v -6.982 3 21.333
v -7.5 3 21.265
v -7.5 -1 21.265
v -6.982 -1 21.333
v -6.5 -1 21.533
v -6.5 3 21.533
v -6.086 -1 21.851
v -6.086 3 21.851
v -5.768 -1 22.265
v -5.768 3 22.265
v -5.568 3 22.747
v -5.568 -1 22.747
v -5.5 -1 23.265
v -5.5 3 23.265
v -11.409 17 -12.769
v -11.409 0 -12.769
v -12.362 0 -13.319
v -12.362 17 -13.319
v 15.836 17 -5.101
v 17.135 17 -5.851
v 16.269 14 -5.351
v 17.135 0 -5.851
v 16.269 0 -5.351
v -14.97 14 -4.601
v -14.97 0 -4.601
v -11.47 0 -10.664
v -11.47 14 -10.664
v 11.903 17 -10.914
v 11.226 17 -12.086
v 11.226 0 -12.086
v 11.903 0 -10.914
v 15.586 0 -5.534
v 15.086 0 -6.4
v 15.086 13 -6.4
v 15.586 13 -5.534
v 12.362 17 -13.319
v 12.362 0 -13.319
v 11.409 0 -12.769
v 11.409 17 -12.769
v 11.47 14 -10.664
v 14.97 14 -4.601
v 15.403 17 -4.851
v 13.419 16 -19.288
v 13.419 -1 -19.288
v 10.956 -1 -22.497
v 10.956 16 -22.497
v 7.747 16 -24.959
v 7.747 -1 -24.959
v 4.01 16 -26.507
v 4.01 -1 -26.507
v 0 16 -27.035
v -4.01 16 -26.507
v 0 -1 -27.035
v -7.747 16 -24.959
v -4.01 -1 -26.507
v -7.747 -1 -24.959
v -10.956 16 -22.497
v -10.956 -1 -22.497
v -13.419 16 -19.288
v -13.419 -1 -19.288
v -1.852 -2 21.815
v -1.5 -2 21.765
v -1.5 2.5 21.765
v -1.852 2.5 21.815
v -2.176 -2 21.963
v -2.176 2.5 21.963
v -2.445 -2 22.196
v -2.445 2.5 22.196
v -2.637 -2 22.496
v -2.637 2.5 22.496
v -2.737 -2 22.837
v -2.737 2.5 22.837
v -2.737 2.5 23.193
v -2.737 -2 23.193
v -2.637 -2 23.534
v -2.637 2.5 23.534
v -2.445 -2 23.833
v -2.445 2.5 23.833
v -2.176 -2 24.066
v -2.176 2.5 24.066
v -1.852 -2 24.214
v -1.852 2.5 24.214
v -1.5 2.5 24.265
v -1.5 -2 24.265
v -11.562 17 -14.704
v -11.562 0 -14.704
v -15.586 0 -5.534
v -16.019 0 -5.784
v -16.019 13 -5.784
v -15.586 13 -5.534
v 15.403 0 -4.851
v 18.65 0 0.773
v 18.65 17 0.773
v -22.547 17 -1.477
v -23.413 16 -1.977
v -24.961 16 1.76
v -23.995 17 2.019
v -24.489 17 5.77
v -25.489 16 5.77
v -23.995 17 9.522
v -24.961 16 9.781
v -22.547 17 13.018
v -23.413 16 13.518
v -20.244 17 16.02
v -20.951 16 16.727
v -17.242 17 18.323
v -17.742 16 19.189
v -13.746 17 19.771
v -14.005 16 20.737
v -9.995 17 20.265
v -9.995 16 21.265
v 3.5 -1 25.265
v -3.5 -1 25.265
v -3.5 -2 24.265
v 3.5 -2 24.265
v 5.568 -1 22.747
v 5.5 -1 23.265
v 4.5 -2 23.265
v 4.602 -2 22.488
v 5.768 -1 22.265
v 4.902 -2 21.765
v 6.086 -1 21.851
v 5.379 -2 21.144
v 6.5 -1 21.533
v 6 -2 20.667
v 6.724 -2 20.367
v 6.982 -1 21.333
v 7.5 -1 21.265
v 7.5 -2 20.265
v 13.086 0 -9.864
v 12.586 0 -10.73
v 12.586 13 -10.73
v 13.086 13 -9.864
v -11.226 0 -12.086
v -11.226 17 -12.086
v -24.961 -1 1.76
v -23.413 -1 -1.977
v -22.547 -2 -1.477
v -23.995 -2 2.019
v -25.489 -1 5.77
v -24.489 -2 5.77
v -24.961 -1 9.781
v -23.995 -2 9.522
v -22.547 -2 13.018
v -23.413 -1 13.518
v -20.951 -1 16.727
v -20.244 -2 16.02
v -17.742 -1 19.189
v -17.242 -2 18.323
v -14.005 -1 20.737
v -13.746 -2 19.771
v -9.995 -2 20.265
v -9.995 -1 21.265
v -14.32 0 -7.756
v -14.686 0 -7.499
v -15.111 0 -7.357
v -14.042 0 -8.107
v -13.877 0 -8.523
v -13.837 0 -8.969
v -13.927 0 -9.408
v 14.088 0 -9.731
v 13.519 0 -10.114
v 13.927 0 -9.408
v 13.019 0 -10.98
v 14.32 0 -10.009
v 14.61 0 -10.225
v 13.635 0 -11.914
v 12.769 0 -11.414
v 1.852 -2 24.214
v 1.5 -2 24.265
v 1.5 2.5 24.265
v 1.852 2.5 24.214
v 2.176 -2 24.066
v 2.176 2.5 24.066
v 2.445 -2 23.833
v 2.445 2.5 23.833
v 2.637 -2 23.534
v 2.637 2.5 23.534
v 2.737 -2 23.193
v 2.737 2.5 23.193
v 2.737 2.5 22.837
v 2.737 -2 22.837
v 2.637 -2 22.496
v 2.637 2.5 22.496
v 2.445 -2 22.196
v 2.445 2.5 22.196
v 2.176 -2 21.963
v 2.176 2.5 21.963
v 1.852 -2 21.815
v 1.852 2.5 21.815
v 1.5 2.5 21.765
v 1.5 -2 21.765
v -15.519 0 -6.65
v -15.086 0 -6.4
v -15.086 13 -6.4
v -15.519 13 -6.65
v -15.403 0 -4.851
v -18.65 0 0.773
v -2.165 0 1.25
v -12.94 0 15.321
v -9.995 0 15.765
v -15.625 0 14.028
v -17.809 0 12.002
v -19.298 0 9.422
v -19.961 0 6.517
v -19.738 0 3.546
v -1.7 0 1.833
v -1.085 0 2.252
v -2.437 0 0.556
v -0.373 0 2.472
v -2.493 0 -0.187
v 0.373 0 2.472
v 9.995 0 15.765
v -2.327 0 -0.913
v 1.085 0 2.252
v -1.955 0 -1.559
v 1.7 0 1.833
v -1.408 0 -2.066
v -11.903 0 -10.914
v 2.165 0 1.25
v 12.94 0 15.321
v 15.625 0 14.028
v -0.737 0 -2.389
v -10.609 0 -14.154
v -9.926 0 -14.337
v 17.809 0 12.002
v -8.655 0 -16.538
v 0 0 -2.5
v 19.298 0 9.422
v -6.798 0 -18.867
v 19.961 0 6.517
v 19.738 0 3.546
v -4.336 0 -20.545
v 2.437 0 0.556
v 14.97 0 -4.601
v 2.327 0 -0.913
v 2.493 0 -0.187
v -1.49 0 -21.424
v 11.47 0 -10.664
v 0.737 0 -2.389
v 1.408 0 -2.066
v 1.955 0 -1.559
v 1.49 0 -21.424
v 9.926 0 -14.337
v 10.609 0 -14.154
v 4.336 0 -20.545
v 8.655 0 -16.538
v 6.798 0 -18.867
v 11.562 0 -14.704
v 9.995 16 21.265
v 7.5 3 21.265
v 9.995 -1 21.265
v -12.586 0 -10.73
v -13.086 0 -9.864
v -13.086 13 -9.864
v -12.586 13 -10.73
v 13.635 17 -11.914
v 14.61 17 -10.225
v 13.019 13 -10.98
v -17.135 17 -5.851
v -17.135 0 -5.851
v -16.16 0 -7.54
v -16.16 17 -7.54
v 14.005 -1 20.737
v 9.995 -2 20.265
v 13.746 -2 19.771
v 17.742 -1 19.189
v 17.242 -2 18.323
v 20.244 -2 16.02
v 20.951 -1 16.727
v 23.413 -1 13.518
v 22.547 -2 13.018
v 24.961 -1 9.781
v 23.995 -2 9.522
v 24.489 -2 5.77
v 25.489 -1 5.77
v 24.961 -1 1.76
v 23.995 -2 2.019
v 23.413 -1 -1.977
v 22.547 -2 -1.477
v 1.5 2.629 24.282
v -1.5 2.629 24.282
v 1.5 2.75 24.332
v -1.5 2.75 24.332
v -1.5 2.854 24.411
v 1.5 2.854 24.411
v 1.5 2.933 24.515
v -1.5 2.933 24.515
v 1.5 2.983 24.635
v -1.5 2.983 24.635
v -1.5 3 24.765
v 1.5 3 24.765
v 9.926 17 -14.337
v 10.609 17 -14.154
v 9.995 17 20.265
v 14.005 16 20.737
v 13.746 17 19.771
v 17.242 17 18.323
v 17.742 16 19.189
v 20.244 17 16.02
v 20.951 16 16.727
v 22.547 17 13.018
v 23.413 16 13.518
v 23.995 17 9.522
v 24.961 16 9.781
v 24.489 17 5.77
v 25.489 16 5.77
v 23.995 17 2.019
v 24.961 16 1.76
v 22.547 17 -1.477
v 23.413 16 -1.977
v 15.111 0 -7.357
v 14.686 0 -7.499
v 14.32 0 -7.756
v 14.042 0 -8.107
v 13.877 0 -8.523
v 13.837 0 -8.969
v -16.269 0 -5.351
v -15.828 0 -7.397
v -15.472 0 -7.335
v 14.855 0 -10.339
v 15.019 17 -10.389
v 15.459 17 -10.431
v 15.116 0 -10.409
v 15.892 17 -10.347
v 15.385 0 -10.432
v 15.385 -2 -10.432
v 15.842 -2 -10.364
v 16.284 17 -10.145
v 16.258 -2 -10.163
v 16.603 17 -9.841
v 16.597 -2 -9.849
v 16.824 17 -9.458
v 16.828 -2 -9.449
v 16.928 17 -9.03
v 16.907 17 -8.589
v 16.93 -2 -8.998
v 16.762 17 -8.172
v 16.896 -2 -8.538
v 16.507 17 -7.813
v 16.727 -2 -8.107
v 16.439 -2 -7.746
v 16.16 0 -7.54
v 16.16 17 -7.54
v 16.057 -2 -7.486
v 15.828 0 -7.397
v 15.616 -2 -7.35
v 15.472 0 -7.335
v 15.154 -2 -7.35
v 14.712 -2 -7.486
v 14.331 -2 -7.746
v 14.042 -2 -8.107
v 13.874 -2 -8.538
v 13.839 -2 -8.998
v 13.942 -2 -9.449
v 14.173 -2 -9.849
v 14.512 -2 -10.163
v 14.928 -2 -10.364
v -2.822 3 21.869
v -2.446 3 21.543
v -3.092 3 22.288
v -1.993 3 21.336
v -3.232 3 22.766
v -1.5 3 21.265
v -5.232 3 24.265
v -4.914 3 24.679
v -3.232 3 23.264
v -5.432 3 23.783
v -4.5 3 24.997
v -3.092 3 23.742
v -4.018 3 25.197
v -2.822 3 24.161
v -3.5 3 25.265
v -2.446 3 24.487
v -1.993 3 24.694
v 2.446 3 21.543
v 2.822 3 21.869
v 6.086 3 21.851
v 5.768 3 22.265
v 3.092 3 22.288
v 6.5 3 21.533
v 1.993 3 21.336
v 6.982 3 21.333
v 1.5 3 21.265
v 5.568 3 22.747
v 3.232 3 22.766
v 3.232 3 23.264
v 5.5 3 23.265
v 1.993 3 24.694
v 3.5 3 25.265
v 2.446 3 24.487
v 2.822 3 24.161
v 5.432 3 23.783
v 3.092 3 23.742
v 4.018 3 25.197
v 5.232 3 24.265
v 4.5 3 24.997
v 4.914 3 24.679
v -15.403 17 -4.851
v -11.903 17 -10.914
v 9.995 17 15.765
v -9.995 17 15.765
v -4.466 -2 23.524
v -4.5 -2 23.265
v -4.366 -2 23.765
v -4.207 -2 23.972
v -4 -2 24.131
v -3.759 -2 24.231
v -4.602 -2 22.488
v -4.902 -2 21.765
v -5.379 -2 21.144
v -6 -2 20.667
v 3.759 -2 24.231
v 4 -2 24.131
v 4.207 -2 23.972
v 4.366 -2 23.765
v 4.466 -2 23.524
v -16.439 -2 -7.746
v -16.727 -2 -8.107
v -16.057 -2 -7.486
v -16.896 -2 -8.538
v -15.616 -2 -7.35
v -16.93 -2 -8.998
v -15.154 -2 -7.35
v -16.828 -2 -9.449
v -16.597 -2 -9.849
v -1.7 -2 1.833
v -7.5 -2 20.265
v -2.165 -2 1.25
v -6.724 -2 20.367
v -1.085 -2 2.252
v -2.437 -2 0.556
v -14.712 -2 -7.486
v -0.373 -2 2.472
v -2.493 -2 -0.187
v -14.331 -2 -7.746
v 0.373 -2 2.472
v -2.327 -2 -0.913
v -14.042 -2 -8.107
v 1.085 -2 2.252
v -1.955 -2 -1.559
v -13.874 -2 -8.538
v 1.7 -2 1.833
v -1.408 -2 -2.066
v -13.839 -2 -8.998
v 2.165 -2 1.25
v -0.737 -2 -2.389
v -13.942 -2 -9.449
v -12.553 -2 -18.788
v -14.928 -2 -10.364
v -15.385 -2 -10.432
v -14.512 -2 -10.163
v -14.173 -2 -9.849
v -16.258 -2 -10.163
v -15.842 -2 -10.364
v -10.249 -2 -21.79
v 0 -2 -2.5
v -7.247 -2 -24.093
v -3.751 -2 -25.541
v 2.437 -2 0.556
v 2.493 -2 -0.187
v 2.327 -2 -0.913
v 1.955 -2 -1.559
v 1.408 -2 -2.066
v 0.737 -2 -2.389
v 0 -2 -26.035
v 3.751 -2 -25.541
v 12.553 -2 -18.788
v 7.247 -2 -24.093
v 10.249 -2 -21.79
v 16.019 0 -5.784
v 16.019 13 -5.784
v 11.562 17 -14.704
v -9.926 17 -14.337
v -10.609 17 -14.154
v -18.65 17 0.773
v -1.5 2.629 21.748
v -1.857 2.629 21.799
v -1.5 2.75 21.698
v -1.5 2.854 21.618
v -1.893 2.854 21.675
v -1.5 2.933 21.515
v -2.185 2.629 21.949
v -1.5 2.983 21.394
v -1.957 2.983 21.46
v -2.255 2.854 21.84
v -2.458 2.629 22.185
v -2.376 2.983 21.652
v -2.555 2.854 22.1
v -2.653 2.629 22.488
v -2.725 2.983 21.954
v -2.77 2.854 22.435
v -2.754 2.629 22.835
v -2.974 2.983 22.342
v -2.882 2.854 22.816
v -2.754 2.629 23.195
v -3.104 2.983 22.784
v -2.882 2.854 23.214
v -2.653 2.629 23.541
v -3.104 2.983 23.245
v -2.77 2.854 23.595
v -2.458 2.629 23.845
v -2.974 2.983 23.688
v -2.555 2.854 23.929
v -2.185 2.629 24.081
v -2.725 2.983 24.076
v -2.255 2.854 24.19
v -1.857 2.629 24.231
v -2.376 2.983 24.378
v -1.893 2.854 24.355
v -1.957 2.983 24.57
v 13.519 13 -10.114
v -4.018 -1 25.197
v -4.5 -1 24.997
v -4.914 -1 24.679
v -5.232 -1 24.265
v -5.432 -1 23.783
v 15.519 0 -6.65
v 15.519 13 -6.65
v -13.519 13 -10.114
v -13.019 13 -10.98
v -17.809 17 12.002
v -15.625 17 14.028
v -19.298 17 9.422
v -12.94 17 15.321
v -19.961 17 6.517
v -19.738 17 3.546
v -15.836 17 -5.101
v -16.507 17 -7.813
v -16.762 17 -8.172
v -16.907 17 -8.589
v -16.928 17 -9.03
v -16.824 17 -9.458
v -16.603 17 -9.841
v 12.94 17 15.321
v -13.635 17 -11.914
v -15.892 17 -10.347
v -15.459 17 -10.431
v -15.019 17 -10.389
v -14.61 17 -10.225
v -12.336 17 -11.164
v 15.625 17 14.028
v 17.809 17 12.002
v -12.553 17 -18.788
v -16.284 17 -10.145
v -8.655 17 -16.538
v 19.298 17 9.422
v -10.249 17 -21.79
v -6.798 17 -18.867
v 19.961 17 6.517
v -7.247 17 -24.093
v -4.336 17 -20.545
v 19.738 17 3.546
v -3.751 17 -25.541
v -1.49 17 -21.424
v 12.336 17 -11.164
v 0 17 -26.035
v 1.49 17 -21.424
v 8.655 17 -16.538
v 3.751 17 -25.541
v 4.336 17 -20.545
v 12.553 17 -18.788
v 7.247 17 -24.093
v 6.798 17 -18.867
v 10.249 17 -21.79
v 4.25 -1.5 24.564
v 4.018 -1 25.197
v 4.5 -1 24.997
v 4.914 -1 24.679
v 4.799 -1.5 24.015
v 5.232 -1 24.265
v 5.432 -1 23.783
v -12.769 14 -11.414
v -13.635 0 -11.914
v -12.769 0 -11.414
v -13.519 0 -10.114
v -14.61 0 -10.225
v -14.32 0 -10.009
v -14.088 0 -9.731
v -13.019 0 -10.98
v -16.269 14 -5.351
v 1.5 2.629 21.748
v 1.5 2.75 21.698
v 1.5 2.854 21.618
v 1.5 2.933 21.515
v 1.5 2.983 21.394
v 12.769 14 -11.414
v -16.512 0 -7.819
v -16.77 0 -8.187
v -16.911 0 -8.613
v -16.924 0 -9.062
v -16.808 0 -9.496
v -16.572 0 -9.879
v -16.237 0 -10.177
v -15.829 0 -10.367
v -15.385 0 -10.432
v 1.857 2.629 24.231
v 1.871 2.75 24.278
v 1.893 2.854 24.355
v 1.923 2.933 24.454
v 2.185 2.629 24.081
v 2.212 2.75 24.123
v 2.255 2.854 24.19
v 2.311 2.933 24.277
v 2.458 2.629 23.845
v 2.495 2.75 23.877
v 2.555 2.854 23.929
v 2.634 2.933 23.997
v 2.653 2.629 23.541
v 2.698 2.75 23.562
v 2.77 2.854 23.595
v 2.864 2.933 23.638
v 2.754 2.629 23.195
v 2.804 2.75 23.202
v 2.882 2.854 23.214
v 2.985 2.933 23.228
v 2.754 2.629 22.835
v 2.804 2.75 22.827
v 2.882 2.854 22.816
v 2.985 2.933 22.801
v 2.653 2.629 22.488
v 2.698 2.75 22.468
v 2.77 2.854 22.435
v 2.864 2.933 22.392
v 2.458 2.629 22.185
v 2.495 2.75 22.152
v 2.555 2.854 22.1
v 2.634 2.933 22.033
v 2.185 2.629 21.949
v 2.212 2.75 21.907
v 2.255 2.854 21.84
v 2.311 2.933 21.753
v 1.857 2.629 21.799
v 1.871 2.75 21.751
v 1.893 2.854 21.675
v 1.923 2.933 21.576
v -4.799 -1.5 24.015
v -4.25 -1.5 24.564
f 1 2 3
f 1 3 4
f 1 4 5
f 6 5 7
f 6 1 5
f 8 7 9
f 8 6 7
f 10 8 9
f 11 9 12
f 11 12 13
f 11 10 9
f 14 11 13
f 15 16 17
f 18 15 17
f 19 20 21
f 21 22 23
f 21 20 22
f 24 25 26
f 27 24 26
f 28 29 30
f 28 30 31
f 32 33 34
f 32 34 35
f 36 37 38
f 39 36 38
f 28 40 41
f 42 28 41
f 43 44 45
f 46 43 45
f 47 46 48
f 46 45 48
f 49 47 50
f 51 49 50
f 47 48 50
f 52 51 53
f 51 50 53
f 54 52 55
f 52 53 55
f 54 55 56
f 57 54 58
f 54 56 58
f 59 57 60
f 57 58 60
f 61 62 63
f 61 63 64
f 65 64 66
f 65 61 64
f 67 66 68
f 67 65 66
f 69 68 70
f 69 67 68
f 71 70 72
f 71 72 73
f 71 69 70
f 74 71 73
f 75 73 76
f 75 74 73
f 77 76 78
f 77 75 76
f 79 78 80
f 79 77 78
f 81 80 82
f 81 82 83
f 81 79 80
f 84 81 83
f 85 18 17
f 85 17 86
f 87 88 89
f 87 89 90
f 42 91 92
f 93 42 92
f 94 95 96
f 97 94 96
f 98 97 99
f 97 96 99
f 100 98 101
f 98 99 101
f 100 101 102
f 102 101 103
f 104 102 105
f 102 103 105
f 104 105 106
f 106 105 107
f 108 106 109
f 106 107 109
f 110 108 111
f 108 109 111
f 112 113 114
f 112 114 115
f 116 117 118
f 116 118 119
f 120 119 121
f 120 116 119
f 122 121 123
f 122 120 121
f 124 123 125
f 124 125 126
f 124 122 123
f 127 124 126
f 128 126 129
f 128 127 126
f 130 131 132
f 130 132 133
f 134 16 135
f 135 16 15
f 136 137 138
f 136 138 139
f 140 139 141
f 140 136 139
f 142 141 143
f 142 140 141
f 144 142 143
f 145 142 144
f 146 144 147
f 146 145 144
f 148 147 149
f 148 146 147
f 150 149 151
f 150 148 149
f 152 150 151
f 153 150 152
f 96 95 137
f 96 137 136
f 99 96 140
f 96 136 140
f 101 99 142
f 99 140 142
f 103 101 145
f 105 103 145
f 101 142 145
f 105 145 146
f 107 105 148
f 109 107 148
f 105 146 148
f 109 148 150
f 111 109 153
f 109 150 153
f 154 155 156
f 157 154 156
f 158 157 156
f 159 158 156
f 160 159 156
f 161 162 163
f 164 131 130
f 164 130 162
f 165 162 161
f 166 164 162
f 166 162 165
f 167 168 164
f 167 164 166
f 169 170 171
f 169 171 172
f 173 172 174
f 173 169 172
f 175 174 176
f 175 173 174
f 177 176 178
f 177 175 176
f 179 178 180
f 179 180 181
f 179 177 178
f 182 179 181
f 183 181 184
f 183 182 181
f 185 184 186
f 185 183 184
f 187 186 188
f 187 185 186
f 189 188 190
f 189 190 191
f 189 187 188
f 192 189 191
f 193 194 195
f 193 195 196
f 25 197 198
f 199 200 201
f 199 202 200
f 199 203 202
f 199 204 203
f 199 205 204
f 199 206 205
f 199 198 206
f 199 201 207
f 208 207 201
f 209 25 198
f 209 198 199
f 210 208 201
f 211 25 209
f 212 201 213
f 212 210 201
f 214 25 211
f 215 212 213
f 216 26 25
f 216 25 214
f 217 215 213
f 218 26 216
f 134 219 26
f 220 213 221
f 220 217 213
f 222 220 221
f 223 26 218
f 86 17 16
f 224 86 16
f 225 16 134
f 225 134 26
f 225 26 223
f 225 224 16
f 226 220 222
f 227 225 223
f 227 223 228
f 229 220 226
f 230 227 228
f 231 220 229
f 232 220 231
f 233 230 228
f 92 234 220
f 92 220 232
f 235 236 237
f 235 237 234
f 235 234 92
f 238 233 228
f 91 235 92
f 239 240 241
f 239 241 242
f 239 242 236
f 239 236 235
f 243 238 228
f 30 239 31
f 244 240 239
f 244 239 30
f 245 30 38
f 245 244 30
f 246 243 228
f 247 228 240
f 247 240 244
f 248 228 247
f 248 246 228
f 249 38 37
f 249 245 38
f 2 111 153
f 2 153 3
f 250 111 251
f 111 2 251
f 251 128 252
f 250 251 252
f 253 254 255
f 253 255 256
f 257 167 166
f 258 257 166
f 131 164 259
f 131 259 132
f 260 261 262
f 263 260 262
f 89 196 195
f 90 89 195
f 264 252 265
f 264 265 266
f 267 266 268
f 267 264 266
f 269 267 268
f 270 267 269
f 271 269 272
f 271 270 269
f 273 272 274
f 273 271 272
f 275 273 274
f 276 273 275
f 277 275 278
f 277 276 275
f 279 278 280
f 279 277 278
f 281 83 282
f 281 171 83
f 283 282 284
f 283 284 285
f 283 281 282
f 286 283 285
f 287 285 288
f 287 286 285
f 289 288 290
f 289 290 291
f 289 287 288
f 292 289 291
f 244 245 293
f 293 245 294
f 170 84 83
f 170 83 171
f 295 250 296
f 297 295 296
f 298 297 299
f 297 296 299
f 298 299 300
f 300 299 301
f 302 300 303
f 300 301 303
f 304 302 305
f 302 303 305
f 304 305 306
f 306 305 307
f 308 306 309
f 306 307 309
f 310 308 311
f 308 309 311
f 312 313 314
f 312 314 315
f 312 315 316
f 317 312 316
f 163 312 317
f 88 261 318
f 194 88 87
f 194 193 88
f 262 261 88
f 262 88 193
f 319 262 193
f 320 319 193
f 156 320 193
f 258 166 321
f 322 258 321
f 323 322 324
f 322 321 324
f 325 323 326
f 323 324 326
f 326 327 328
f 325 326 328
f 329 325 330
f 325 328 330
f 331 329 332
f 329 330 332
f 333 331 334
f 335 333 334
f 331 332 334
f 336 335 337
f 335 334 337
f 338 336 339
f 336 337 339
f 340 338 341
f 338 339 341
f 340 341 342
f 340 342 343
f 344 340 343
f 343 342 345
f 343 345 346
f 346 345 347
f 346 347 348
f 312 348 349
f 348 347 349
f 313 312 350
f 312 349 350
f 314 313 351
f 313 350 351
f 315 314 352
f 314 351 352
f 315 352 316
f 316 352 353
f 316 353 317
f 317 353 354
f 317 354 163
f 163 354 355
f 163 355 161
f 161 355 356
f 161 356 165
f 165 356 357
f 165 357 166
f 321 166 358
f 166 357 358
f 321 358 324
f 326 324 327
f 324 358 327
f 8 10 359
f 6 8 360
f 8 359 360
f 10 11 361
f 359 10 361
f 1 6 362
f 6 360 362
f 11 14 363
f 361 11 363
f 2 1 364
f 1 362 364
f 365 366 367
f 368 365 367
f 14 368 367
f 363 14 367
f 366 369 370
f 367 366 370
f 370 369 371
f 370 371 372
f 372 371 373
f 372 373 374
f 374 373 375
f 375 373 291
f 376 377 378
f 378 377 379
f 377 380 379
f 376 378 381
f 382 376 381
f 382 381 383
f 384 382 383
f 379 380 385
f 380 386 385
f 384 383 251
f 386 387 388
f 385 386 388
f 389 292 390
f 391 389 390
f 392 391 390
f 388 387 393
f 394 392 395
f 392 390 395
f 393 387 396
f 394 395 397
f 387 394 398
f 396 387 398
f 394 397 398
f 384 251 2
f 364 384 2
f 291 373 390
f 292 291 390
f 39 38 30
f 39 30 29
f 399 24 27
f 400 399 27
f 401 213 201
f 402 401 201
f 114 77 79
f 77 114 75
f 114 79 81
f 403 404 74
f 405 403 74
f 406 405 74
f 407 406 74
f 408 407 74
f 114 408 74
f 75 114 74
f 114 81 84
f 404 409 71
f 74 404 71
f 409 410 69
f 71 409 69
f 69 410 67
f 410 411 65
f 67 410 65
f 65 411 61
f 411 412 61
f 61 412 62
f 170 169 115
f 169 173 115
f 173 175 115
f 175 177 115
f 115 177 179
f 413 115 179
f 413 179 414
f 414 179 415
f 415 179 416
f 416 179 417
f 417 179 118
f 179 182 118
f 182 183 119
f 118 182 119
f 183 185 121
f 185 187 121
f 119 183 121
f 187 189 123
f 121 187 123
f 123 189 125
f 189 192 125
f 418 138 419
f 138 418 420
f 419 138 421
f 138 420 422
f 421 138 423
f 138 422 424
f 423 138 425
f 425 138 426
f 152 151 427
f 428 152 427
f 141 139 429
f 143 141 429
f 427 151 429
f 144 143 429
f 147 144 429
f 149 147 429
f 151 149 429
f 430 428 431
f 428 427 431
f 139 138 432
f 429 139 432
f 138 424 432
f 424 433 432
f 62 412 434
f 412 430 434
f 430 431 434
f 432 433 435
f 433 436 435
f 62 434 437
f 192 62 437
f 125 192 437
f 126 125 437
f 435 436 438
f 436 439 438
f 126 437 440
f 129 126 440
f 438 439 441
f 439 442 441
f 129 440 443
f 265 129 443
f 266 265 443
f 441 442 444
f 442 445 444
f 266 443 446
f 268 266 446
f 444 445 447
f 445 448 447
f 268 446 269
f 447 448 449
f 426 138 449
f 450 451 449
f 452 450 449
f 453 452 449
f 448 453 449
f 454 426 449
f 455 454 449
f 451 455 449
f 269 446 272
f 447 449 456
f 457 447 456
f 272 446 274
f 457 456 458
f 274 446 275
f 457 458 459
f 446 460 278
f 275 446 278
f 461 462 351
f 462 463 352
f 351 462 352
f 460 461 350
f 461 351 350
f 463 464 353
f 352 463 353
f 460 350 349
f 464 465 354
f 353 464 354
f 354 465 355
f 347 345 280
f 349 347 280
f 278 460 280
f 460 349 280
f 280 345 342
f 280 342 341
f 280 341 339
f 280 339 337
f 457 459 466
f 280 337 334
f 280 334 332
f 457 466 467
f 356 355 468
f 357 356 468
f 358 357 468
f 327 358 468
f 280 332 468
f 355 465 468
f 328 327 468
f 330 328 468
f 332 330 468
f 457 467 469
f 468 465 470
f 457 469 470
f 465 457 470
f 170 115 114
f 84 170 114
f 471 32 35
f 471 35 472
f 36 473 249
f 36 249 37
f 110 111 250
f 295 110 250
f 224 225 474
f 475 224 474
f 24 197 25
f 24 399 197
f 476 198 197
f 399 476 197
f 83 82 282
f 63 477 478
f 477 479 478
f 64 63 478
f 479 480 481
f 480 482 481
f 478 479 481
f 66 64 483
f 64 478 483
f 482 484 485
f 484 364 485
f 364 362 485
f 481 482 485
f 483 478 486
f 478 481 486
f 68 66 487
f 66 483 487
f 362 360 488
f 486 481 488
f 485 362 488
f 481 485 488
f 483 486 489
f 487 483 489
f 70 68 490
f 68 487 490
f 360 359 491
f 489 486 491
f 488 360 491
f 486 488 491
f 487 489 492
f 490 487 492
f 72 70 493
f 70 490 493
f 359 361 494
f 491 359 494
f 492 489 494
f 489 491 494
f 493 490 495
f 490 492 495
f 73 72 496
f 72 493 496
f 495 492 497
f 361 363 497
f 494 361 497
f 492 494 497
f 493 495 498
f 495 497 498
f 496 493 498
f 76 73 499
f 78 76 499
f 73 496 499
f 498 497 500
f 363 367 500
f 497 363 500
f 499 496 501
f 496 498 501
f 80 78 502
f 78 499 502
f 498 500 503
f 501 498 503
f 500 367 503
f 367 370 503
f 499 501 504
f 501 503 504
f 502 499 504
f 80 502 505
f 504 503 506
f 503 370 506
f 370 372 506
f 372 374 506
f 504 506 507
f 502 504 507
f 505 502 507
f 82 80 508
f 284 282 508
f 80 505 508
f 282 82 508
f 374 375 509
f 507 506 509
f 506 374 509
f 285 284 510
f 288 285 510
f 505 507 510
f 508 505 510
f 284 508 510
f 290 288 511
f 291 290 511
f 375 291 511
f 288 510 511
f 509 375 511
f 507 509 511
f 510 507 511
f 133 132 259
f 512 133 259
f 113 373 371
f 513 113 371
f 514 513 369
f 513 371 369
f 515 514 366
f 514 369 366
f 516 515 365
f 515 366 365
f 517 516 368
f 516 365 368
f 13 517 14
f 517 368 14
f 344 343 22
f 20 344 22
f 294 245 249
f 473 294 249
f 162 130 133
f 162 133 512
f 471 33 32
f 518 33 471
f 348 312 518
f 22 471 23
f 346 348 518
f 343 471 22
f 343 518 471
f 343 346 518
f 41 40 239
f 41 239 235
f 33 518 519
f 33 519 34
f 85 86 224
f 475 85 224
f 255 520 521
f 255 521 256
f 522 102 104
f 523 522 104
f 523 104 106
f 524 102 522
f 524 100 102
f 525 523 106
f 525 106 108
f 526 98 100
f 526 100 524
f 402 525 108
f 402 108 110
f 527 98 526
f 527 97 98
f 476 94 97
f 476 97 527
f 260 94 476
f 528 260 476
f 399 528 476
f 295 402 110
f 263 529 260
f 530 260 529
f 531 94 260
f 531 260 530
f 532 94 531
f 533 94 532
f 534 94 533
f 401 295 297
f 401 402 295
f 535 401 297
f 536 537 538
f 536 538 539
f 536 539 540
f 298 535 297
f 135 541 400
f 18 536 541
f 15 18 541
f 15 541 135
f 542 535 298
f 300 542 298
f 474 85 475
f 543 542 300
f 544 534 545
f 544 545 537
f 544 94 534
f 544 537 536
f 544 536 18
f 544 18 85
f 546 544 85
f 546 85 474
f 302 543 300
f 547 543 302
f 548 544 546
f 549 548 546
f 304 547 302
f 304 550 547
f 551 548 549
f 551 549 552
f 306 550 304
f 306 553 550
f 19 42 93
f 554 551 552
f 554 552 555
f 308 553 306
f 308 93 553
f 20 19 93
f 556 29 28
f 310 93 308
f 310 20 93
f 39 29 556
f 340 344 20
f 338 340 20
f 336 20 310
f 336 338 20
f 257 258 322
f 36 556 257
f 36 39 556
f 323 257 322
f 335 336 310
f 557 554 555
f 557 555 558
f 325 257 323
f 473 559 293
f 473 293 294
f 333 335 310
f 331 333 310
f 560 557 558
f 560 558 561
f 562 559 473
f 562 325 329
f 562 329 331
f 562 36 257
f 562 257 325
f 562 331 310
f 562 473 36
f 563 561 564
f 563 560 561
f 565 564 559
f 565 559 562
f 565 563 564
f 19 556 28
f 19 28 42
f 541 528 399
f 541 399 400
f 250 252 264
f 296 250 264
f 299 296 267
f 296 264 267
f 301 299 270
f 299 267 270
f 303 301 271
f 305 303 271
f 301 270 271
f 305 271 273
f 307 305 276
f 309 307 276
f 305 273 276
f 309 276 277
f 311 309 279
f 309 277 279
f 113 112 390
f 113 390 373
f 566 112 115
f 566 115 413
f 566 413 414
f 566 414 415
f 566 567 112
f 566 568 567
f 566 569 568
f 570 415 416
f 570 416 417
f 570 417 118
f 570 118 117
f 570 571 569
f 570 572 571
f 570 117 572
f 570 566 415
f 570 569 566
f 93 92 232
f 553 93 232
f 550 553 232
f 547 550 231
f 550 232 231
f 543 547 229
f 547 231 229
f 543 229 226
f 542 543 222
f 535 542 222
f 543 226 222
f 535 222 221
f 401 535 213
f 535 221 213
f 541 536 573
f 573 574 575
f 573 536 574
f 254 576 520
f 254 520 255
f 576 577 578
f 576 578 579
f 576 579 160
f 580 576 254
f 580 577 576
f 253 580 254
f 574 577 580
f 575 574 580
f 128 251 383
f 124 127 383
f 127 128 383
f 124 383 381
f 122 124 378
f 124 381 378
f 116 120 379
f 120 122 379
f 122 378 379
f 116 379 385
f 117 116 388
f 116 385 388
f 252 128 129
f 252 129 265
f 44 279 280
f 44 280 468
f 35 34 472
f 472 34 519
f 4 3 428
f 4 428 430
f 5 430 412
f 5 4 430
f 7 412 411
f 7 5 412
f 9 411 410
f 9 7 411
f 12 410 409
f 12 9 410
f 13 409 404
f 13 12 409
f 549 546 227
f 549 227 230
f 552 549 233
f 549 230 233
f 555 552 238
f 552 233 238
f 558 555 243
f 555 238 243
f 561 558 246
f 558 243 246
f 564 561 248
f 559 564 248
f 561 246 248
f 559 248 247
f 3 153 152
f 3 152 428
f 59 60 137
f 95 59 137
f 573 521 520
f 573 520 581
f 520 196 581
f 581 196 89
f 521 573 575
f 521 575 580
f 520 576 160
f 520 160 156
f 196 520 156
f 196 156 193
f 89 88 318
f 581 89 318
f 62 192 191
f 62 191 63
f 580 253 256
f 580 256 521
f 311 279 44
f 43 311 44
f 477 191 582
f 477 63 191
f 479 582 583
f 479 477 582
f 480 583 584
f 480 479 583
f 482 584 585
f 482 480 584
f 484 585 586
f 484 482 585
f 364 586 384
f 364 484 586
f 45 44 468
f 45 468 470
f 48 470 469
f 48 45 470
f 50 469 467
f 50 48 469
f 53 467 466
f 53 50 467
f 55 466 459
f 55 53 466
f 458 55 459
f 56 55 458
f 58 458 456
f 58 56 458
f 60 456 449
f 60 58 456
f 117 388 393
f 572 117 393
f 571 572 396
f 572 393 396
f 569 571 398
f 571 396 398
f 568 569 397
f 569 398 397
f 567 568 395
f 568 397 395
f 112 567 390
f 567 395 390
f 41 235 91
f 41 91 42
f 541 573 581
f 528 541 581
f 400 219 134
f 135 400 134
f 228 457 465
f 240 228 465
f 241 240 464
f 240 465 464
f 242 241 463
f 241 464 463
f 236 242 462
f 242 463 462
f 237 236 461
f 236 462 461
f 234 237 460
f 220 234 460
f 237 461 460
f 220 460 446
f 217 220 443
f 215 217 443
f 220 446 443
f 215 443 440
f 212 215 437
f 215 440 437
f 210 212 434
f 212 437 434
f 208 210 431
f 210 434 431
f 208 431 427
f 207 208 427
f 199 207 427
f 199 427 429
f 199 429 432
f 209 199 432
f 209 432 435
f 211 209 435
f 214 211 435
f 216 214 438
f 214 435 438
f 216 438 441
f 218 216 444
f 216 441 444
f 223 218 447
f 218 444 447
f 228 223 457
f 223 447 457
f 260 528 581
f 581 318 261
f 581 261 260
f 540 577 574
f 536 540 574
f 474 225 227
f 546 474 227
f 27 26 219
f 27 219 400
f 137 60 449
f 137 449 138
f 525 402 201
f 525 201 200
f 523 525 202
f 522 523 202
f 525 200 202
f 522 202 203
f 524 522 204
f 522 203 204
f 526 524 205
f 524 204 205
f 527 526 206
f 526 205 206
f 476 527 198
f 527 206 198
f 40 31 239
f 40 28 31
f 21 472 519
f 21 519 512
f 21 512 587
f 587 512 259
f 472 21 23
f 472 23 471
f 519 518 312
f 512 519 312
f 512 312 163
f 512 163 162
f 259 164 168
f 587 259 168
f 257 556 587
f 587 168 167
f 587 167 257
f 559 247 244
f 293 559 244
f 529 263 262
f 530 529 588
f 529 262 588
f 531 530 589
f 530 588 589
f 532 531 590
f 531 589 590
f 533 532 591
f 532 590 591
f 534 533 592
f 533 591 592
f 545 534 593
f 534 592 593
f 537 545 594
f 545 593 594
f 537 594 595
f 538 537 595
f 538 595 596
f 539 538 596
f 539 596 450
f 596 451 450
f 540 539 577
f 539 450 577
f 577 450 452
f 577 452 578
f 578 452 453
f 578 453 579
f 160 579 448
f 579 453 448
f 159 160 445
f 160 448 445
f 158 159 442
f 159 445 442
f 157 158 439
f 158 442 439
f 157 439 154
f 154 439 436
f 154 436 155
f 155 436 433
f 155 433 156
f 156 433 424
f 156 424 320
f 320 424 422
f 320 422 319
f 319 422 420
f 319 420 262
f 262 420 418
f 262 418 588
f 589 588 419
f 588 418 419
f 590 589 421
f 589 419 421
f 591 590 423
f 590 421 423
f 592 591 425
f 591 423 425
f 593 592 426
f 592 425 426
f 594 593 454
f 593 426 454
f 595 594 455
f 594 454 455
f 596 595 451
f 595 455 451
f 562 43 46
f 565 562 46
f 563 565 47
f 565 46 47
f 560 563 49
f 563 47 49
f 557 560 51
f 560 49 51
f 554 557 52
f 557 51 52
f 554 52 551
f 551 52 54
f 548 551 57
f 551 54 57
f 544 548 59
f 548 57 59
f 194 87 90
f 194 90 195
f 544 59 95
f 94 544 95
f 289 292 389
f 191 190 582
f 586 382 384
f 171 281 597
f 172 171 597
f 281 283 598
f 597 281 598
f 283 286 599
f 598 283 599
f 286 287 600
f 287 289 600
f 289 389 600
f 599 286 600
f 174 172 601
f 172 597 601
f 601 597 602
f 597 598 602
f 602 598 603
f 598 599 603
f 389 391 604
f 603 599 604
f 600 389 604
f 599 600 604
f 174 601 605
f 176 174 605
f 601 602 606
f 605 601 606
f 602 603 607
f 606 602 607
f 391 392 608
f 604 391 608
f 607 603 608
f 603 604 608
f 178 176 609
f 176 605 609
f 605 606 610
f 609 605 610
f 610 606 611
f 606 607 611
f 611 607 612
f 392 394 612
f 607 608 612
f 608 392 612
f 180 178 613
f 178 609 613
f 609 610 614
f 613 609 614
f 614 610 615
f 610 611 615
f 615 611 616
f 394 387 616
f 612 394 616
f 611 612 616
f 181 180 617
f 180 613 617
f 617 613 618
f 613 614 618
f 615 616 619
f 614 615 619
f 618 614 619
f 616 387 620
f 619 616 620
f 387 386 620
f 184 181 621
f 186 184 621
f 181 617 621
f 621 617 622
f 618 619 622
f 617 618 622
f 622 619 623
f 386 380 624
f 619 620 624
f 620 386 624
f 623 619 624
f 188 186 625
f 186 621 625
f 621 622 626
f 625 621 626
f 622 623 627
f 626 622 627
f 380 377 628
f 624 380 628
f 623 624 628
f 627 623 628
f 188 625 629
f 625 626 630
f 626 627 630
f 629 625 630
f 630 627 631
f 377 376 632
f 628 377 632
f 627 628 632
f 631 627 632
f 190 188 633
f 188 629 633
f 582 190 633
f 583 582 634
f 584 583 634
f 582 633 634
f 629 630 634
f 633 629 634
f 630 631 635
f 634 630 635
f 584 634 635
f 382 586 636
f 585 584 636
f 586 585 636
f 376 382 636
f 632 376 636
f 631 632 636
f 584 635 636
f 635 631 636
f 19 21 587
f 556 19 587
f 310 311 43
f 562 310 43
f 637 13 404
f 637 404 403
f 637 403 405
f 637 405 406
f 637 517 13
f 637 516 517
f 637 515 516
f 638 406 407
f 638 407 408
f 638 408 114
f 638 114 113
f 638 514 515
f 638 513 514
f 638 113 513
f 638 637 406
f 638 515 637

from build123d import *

# Parameters (mm, degrees)
BOSS_EXTRUDE1_DEPTH = 17
CHAMFER1_SIZE       = 0.5
CUT_EXTRUDE1_DEPTH  = 13
BOSS_EXTRUDE2_START = -2
BOSS_EXTRUDE2_DEPTH = 2
SKETCH2_R           = 1.5499999999999992
SKETCH2_R_2         = 1.550000000000003
SKETCH2_R_3         = 2.5
CUT_EXTRUDE2_DEPTH  = 2
BOSS_EXTRUDE3_DEPTH = 5
FILLET1_R           = 2
FILLET2_R           = 0.5
CHAMFER3_SIZE       = 0.5
CHAMFER3_SIZE2      = 3
CHAMFER4_SIZE       = 1


with BuildPart() as part:
    # Sketch1 → Boss-Extrude1 (new body)
    with BuildSketch(Plane(origin=(0, 0, 0), x_dir=(1, 0, 0), z_dir=(0, 1, 0))):
        with BuildLine():
            ThreePointArc((13.418634843133532, 19.2879126019326), (5.33e-15, 27.035165040773038), (-13.418634843133521, 19.287912601932604))
            Line((-13.418634843133521, 19.2879126019326), (-23.413139720814414, 1.9769223572943453))
            ThreePointArc((-23.413139720814414, 1.976922357294347), (-23.413139720814407, -13.517582520386524), (-9.994504877680875, -21.264834959226956))
            Line((-9.994504877680875, -21.264834959226956), (9.994504877680878, -21.26483495922696))
            ThreePointArc((9.994504877680878, -21.26483495922696), (23.413139720814414, -13.517582520386526), (23.41313972081442, 1.9769223572943506))
            Line((23.41313972081442, 1.9769223572943488), (13.418634843133532, 19.2879126019326))
        make_face()
        with BuildLine():
            Line((-11.469734859267339, 10.663506392859015), (-11.902747561159552, 10.91350639285901))
            Line((-11.902747561159554, 10.91350639285901), (-10.975952641916443, 12.518762281184774))
            Line((-10.975952641916448, 12.518762281184776), (-12.361593287971548, 13.318762281184778))
            Line((-12.361593287971548, 13.318762281184778), (-11.561593287971546, 14.70440292723988))
            Line((-11.561593287971546, 14.70440292723988), (-10.17595264191644, 13.904402927239877))
            Line((-10.175952641916442, 13.904402927239877), (-8.655495122319113, 16.537912601932604))
            ThreePointArc((-8.655495122319113, 16.537912601932604), (1.33e-15, 21.535165040773038), (8.655495122319117, 16.537912601932604))
            Line((8.655495122319117, 16.537912601932604), (10.175952641916444, 13.904402927239877))
            Line((10.175952641916444, 13.904402927239877), (11.561593287971549, 14.70440292723988))
            Line((11.561593287971549, 14.70440292723988), (12.361593287971552, 13.318762281184778))
            Line((12.361593287971552, 13.318762281184778), (10.975952641916452, 12.518762281184776))
            Line((10.975952641916447, 12.518762281184772), (11.902747561159558, 10.91350639285901))
            Line((11.902747561159556, 10.913506392859007), (11.46973485926734, 10.663506392859015))
            Line((11.46973485926734, 10.663506392859015), (14.969734859267339, 4.601328566367944))
            Line((14.969734859267339, 4.601328566367944), (15.402747561159552, 4.851328566367944))
            Line((15.402747561159552, 4.8513285663679415), (18.64999999999999, -0.7730776427056512))
            ThreePointArc((18.64999999999999, -0.7730776427056494), (18.65, -10.767582520386522), (9.994504877680878, -15.764834959226958))
            Line((9.994504877680878, -15.76483495922696), (-9.994504877680871, -15.76483495922696))
            ThreePointArc((-9.994504877680868, -15.76483495922696), (-18.64999999999999, -10.767582520386524), (-18.64999999999999, -0.7730776427056494))
            Line((-18.64999999999999, -0.7730776427056512), (-15.402747561159547, 4.851328566367947))
            Line((-15.40274756115955, 4.851328566367947), (-14.969734859267337, 4.601328566367946))
            Line((-14.969734859267337, 4.601328566367946), (-11.469734859267339, 10.663506392859015))
        make_face(mode=Mode.SUBTRACT)
        with BuildLine():
            Line((13.63479836872844, 11.913506392859018), (14.609798368728441, 10.224756855479358))
            ThreePointArc((14.609798368728436, 10.224756855479354), (16.727137744594316, 9.657417479613473), (16.159798368728428, 7.540078103747593))
            Line((16.15979836872844, 7.5400781037476), (17.13479836872844, 5.851328566367942))
            Line((17.13479836872844, 5.851328566367942), (16.268772964944, 5.351328566367942))
            Line((16.268772964944, 5.351328566367942), (12.768772964944, 11.413506392859018))
            Line((12.768772964944, 11.413506392859018), (13.63479836872844, 11.913506392859018))
        make_face(mode=Mode.SUBTRACT)
        with BuildLine():
            Line((-13.634798368728436, 11.913506392859018), (-12.768772964943997, 11.413506392859018))
            Line((-12.768772964943997, 11.413506392859018), (-16.268772964944, 5.351328566367942))
            Line((-16.268772964944, 5.351328566367942), (-17.13479836872844, 5.851328566367942))
            Line((-17.13479836872844, 5.851328566367942), (-16.159798368728442, 7.540078103747597))
            ThreePointArc((-16.159798368728435, 7.540078103747593), (-16.727137744594312, 9.65741747961347), (-14.60979836872844, 10.224756855479354))
            Line((-14.609798368728441, 10.224756855479356), (-13.634798368728436, 11.913506392859018))
        make_face(mode=Mode.SUBTRACT)
    extrude(amount=BOSS_EXTRUDE1_DEPTH)

    # Chamfer1
    chamfer1_edges = [part.edges().sort_by_distance(p)[0] for p in [
        (-10.175952641916442, 8.5, -13.904402927239877),
        (-10.975952641916447, 8.5, -12.518762281184774),
        (10.97595264191645, 8.5, -12.518762281184774),
        (10.175952641916444, 8.5, -13.904402927239877),
    ]]
    chamfer(chamfer1_edges, length=CHAMFER1_SIZE)

    # Sketch1<3> → Cut-Extrude1 (cut)
    with BuildSketch(Plane(origin=(0, 0, 0), x_dir=(1, 0, 0), z_dir=(0, 1, 0))):
        Polygon((-12.585760263051778, 10.7304936909668), (-13.018772964943997, 10.9804936909668), (-13.518772964943999, 10.114468287182358), (-13.085760263051776, 9.86446828718236), align=None)
        Polygon((-15.08576026305178, 6.400366672044599), (-15.518772964944, 6.650366672044602), (-16.018772964944, 5.784341268260162), (-15.585760263051782, 5.53434126826016), align=None)
        Polygon((13.518772964944, 10.114468287182358), (13.018772964944, 10.9804936909668), (12.585760263051782, 10.7304936909668), (13.08576026305178, 9.86446828718236), align=None)
        Polygon((16.018772964944, 5.784341268260162), (15.518772964944, 6.6503666720445995), (15.085760263051784, 6.400366672044599), (15.585760263051785, 5.53434126826016), align=None)
    extrude(amount=CUT_EXTRUDE1_DEPTH, mode=Mode.SUBTRACT)

    # Sketch1<4> → Boss-Extrude2 (add)
    with BuildSketch(Plane(origin=(0, 0, 0), x_dir=(1, 0, 0), z_dir=(0, 1, 0)).offset(BOSS_EXTRUDE2_START)):
        with BuildLine():
            Line((-13.418634843133521, 19.2879126019326), (-23.413139720814414, 1.976922357294346))
            ThreePointArc((-23.413139720814414, 1.976922357294346), (-23.413139720814407, -13.517582520386522), (-9.994504877680875, -21.264834959226956))
            Line((-9.994504877680875, -21.264834959226956), (9.994504877680878, -21.26483495922696))
            ThreePointArc((9.994504877680878, -21.26483495922696), (23.413139720814414, -13.517582520386522), (23.41313972081442, 1.9769223572943484))
            Line((23.41313972081442, 1.9769223572943484), (13.418634843133532, 19.2879126019326))
            ThreePointArc((13.418634843133532, 19.2879126019326), (3.63e-15, 27.035165040773038), (-13.418634843133521, 19.2879126019326))
        make_face()
    extrude(amount=BOSS_EXTRUDE2_DEPTH)

    # Sketch2 → Cut-Extrude2 (cut)
    # profile 1 of 4: a face of its own
    with BuildSketch(Plane.XZ.offset(2)):
        with Locations(Location((-15.384798368728436, -8.882417479613482, 0), (0, 0, 270))):
            Circle(SKETCH2_R)
    # profile 2 of 4: a face of its own
    with BuildSketch(Plane.XZ.offset(2)):
        with Locations(Location((15.38479836872844, -8.882417479613482, 0), (0, 0, 270))):
            Circle(SKETCH2_R_2)
    # profile 3 of 4: a face of its own
    with BuildSketch(Plane.XZ.offset(2)):
        with Locations(Location((0, 0, 0), (0, 0, 270))):
            Circle(SKETCH2_R_3)
    # profile 4 of 4: a face of its own
    with BuildSketch(Plane.XZ.offset(2)):
        Polygon((5.499999999999999, 21.264834959226956), (5.5, 25.264834959226956), (-5.5, 25.264834959226956), (-5.499999999999999, 21.264834959226956), align=None)
        with BuildLine():
            Line((-1.4999999999999987, 24.264834959226945), (1.4999999999999987, 24.264834959226945))
            ThreePointArc((1.4999999999999987, 24.264834959226945), (2.7499999999999916, 23.014834959226953), (1.4999999999999987, 21.76483495922696))
            Line((1.4999999999999987, 21.76483495922696), (-1.4999999999999987, 21.76483495922696))
            ThreePointArc((-1.4999999999999987, 21.76483495922696), (-2.7499999999999916, 23.014834959226953), (-1.4999999999999987, 24.264834959226945))
        make_face(mode=Mode.SUBTRACT)
    extrude(amount=-CUT_EXTRUDE2_DEPTH, mode=Mode.SUBTRACT)

    # Sketch2<2> → Boss-Extrude3 (add)
    with BuildSketch(Plane.XZ.offset(2)):
        Polygon((-5.499999999999999, 21.264834959226956), (5.499999999999999, 21.264834959226956), (5.5, 25.264834959226956), (-5.5, 25.264834959226956), align=None)
        with BuildLine():
            ThreePointArc((-1.499999999999999, 21.76483495922696), (-2.7499999999999916, 23.014834959226953), (-1.4999999999999987, 24.264834959226945))
            Line((-1.4999999999999987, 24.264834959226945), (1.4999999999999987, 24.264834959226945))
            ThreePointArc((1.499999999999999, 24.264834959226945), (2.7499999999999916, 23.014834959226953), (1.4999999999999987, 21.76483495922696))
            Line((1.4999999999999987, 21.76483495922696), (-1.4999999999999987, 21.76483495922696))
        make_face(mode=Mode.SUBTRACT)
    extrude(amount=-BOSS_EXTRUDE3_DEPTH)

    # Fillet1
    fillet1_edges = [part.edges().sort_by_distance(p)[0] for p in [
        (5.499999999999999, 0.5, 21.264834959226956),
        (-5.499999999999999, 0.5, 21.264834959226956),
    ]]
    fillet(fillet1_edges, radius=FILLET1_R)
    fillet1_2_edges = [part.edges().sort_by_distance(p)[0] for p in [
        (5.5, 0.5, 25.264834959226956),
        (-5.5, 0.5, 25.264834959226956),
    ]]
    fillet(fillet1_2_edges, radius=FILLET1_R - 0.0001)  # a hair under: the kernel refuses the full size

    # Fillet2
    fillet2_edges = [part.edges().sort_by_distance(p)[0] for p in [
        (0, 3, 24.264834959226945),
        (2.7499999999999916, 3, 23.014834959226953),
        (-2.7499999999999916, 3, 23.014834959226953),
        (0, 3, 21.76483495922696),
    ]]
    fillet(fillet2_edges, radius=FILLET2_R - 0.0001)  # a hair under: the kernel refuses the full size

    # Chamfer3
    chamfer3_edges = [part.edges().sort_by_distance(p)[0] for p in [
        (13.21973485926734, 17, -7.63241747961348),
        (-13.219734859267337, 17, -7.63241747961348),
        (14.518772964943999, 17, -8.38241747961348),
        (-14.518772964943999, 17, -8.38241747961348),
    ]]
    chamfer3_side = [part.faces().sort_by_distance(p)[0] for p in [
        (-12.172522474712478, 17, -11.850756469441762),
    ]]
    chamfer(chamfer3_edges, length=CHAMFER3_SIZE, length2=CHAMFER3_SIZE2, reference=chamfer3_side[0])

    # Chamfer4
    chamfer4_edges = [part.edges().sort_by_distance(p)[0] for p in [
        (1.78e-15, 17, 21.26483495922696),
        (23.413139720814414, 17, 13.517582520386522),
        (18.415887281973976, 17, -10.632417479613474),
        (4.44e-15, 17, -27.035165040773038),
        (-18.415887281973966, 17, -10.632417479613473),
        (-23.413139720814407, 17, 13.517582520386526),
        (5.33e-15, -2, -27.035165040773038),
        (23.413139720814414, -2, 13.517582520386526),
        (-8.747252438840437, -2, 21.264834959226956),
        (-23.413139720814407, -2, 13.517582520386524),
        (-18.415887281973966, -2, -10.632417479613473),
        (18.415887281973976, -2, -10.632417479613474),
        (8.747252438840441, -2, 21.26483495922696),
        (0, -2, 25.264834959226956),
        (-4.9142428516949765, -2, 24.67907781092193),
        (4.914242851694976, -2, 24.67907781092193),
        (6.085786437626905, -2, 21.850621396853864),
        (-6.085786437626905, -2, 21.85062139685386),
    ]]
    chamfer(chamfer4_edges, length=CHAMFER4_SIZE - 0.0001)  # a hair under: the kernel refuses the full size


solid = part.part
